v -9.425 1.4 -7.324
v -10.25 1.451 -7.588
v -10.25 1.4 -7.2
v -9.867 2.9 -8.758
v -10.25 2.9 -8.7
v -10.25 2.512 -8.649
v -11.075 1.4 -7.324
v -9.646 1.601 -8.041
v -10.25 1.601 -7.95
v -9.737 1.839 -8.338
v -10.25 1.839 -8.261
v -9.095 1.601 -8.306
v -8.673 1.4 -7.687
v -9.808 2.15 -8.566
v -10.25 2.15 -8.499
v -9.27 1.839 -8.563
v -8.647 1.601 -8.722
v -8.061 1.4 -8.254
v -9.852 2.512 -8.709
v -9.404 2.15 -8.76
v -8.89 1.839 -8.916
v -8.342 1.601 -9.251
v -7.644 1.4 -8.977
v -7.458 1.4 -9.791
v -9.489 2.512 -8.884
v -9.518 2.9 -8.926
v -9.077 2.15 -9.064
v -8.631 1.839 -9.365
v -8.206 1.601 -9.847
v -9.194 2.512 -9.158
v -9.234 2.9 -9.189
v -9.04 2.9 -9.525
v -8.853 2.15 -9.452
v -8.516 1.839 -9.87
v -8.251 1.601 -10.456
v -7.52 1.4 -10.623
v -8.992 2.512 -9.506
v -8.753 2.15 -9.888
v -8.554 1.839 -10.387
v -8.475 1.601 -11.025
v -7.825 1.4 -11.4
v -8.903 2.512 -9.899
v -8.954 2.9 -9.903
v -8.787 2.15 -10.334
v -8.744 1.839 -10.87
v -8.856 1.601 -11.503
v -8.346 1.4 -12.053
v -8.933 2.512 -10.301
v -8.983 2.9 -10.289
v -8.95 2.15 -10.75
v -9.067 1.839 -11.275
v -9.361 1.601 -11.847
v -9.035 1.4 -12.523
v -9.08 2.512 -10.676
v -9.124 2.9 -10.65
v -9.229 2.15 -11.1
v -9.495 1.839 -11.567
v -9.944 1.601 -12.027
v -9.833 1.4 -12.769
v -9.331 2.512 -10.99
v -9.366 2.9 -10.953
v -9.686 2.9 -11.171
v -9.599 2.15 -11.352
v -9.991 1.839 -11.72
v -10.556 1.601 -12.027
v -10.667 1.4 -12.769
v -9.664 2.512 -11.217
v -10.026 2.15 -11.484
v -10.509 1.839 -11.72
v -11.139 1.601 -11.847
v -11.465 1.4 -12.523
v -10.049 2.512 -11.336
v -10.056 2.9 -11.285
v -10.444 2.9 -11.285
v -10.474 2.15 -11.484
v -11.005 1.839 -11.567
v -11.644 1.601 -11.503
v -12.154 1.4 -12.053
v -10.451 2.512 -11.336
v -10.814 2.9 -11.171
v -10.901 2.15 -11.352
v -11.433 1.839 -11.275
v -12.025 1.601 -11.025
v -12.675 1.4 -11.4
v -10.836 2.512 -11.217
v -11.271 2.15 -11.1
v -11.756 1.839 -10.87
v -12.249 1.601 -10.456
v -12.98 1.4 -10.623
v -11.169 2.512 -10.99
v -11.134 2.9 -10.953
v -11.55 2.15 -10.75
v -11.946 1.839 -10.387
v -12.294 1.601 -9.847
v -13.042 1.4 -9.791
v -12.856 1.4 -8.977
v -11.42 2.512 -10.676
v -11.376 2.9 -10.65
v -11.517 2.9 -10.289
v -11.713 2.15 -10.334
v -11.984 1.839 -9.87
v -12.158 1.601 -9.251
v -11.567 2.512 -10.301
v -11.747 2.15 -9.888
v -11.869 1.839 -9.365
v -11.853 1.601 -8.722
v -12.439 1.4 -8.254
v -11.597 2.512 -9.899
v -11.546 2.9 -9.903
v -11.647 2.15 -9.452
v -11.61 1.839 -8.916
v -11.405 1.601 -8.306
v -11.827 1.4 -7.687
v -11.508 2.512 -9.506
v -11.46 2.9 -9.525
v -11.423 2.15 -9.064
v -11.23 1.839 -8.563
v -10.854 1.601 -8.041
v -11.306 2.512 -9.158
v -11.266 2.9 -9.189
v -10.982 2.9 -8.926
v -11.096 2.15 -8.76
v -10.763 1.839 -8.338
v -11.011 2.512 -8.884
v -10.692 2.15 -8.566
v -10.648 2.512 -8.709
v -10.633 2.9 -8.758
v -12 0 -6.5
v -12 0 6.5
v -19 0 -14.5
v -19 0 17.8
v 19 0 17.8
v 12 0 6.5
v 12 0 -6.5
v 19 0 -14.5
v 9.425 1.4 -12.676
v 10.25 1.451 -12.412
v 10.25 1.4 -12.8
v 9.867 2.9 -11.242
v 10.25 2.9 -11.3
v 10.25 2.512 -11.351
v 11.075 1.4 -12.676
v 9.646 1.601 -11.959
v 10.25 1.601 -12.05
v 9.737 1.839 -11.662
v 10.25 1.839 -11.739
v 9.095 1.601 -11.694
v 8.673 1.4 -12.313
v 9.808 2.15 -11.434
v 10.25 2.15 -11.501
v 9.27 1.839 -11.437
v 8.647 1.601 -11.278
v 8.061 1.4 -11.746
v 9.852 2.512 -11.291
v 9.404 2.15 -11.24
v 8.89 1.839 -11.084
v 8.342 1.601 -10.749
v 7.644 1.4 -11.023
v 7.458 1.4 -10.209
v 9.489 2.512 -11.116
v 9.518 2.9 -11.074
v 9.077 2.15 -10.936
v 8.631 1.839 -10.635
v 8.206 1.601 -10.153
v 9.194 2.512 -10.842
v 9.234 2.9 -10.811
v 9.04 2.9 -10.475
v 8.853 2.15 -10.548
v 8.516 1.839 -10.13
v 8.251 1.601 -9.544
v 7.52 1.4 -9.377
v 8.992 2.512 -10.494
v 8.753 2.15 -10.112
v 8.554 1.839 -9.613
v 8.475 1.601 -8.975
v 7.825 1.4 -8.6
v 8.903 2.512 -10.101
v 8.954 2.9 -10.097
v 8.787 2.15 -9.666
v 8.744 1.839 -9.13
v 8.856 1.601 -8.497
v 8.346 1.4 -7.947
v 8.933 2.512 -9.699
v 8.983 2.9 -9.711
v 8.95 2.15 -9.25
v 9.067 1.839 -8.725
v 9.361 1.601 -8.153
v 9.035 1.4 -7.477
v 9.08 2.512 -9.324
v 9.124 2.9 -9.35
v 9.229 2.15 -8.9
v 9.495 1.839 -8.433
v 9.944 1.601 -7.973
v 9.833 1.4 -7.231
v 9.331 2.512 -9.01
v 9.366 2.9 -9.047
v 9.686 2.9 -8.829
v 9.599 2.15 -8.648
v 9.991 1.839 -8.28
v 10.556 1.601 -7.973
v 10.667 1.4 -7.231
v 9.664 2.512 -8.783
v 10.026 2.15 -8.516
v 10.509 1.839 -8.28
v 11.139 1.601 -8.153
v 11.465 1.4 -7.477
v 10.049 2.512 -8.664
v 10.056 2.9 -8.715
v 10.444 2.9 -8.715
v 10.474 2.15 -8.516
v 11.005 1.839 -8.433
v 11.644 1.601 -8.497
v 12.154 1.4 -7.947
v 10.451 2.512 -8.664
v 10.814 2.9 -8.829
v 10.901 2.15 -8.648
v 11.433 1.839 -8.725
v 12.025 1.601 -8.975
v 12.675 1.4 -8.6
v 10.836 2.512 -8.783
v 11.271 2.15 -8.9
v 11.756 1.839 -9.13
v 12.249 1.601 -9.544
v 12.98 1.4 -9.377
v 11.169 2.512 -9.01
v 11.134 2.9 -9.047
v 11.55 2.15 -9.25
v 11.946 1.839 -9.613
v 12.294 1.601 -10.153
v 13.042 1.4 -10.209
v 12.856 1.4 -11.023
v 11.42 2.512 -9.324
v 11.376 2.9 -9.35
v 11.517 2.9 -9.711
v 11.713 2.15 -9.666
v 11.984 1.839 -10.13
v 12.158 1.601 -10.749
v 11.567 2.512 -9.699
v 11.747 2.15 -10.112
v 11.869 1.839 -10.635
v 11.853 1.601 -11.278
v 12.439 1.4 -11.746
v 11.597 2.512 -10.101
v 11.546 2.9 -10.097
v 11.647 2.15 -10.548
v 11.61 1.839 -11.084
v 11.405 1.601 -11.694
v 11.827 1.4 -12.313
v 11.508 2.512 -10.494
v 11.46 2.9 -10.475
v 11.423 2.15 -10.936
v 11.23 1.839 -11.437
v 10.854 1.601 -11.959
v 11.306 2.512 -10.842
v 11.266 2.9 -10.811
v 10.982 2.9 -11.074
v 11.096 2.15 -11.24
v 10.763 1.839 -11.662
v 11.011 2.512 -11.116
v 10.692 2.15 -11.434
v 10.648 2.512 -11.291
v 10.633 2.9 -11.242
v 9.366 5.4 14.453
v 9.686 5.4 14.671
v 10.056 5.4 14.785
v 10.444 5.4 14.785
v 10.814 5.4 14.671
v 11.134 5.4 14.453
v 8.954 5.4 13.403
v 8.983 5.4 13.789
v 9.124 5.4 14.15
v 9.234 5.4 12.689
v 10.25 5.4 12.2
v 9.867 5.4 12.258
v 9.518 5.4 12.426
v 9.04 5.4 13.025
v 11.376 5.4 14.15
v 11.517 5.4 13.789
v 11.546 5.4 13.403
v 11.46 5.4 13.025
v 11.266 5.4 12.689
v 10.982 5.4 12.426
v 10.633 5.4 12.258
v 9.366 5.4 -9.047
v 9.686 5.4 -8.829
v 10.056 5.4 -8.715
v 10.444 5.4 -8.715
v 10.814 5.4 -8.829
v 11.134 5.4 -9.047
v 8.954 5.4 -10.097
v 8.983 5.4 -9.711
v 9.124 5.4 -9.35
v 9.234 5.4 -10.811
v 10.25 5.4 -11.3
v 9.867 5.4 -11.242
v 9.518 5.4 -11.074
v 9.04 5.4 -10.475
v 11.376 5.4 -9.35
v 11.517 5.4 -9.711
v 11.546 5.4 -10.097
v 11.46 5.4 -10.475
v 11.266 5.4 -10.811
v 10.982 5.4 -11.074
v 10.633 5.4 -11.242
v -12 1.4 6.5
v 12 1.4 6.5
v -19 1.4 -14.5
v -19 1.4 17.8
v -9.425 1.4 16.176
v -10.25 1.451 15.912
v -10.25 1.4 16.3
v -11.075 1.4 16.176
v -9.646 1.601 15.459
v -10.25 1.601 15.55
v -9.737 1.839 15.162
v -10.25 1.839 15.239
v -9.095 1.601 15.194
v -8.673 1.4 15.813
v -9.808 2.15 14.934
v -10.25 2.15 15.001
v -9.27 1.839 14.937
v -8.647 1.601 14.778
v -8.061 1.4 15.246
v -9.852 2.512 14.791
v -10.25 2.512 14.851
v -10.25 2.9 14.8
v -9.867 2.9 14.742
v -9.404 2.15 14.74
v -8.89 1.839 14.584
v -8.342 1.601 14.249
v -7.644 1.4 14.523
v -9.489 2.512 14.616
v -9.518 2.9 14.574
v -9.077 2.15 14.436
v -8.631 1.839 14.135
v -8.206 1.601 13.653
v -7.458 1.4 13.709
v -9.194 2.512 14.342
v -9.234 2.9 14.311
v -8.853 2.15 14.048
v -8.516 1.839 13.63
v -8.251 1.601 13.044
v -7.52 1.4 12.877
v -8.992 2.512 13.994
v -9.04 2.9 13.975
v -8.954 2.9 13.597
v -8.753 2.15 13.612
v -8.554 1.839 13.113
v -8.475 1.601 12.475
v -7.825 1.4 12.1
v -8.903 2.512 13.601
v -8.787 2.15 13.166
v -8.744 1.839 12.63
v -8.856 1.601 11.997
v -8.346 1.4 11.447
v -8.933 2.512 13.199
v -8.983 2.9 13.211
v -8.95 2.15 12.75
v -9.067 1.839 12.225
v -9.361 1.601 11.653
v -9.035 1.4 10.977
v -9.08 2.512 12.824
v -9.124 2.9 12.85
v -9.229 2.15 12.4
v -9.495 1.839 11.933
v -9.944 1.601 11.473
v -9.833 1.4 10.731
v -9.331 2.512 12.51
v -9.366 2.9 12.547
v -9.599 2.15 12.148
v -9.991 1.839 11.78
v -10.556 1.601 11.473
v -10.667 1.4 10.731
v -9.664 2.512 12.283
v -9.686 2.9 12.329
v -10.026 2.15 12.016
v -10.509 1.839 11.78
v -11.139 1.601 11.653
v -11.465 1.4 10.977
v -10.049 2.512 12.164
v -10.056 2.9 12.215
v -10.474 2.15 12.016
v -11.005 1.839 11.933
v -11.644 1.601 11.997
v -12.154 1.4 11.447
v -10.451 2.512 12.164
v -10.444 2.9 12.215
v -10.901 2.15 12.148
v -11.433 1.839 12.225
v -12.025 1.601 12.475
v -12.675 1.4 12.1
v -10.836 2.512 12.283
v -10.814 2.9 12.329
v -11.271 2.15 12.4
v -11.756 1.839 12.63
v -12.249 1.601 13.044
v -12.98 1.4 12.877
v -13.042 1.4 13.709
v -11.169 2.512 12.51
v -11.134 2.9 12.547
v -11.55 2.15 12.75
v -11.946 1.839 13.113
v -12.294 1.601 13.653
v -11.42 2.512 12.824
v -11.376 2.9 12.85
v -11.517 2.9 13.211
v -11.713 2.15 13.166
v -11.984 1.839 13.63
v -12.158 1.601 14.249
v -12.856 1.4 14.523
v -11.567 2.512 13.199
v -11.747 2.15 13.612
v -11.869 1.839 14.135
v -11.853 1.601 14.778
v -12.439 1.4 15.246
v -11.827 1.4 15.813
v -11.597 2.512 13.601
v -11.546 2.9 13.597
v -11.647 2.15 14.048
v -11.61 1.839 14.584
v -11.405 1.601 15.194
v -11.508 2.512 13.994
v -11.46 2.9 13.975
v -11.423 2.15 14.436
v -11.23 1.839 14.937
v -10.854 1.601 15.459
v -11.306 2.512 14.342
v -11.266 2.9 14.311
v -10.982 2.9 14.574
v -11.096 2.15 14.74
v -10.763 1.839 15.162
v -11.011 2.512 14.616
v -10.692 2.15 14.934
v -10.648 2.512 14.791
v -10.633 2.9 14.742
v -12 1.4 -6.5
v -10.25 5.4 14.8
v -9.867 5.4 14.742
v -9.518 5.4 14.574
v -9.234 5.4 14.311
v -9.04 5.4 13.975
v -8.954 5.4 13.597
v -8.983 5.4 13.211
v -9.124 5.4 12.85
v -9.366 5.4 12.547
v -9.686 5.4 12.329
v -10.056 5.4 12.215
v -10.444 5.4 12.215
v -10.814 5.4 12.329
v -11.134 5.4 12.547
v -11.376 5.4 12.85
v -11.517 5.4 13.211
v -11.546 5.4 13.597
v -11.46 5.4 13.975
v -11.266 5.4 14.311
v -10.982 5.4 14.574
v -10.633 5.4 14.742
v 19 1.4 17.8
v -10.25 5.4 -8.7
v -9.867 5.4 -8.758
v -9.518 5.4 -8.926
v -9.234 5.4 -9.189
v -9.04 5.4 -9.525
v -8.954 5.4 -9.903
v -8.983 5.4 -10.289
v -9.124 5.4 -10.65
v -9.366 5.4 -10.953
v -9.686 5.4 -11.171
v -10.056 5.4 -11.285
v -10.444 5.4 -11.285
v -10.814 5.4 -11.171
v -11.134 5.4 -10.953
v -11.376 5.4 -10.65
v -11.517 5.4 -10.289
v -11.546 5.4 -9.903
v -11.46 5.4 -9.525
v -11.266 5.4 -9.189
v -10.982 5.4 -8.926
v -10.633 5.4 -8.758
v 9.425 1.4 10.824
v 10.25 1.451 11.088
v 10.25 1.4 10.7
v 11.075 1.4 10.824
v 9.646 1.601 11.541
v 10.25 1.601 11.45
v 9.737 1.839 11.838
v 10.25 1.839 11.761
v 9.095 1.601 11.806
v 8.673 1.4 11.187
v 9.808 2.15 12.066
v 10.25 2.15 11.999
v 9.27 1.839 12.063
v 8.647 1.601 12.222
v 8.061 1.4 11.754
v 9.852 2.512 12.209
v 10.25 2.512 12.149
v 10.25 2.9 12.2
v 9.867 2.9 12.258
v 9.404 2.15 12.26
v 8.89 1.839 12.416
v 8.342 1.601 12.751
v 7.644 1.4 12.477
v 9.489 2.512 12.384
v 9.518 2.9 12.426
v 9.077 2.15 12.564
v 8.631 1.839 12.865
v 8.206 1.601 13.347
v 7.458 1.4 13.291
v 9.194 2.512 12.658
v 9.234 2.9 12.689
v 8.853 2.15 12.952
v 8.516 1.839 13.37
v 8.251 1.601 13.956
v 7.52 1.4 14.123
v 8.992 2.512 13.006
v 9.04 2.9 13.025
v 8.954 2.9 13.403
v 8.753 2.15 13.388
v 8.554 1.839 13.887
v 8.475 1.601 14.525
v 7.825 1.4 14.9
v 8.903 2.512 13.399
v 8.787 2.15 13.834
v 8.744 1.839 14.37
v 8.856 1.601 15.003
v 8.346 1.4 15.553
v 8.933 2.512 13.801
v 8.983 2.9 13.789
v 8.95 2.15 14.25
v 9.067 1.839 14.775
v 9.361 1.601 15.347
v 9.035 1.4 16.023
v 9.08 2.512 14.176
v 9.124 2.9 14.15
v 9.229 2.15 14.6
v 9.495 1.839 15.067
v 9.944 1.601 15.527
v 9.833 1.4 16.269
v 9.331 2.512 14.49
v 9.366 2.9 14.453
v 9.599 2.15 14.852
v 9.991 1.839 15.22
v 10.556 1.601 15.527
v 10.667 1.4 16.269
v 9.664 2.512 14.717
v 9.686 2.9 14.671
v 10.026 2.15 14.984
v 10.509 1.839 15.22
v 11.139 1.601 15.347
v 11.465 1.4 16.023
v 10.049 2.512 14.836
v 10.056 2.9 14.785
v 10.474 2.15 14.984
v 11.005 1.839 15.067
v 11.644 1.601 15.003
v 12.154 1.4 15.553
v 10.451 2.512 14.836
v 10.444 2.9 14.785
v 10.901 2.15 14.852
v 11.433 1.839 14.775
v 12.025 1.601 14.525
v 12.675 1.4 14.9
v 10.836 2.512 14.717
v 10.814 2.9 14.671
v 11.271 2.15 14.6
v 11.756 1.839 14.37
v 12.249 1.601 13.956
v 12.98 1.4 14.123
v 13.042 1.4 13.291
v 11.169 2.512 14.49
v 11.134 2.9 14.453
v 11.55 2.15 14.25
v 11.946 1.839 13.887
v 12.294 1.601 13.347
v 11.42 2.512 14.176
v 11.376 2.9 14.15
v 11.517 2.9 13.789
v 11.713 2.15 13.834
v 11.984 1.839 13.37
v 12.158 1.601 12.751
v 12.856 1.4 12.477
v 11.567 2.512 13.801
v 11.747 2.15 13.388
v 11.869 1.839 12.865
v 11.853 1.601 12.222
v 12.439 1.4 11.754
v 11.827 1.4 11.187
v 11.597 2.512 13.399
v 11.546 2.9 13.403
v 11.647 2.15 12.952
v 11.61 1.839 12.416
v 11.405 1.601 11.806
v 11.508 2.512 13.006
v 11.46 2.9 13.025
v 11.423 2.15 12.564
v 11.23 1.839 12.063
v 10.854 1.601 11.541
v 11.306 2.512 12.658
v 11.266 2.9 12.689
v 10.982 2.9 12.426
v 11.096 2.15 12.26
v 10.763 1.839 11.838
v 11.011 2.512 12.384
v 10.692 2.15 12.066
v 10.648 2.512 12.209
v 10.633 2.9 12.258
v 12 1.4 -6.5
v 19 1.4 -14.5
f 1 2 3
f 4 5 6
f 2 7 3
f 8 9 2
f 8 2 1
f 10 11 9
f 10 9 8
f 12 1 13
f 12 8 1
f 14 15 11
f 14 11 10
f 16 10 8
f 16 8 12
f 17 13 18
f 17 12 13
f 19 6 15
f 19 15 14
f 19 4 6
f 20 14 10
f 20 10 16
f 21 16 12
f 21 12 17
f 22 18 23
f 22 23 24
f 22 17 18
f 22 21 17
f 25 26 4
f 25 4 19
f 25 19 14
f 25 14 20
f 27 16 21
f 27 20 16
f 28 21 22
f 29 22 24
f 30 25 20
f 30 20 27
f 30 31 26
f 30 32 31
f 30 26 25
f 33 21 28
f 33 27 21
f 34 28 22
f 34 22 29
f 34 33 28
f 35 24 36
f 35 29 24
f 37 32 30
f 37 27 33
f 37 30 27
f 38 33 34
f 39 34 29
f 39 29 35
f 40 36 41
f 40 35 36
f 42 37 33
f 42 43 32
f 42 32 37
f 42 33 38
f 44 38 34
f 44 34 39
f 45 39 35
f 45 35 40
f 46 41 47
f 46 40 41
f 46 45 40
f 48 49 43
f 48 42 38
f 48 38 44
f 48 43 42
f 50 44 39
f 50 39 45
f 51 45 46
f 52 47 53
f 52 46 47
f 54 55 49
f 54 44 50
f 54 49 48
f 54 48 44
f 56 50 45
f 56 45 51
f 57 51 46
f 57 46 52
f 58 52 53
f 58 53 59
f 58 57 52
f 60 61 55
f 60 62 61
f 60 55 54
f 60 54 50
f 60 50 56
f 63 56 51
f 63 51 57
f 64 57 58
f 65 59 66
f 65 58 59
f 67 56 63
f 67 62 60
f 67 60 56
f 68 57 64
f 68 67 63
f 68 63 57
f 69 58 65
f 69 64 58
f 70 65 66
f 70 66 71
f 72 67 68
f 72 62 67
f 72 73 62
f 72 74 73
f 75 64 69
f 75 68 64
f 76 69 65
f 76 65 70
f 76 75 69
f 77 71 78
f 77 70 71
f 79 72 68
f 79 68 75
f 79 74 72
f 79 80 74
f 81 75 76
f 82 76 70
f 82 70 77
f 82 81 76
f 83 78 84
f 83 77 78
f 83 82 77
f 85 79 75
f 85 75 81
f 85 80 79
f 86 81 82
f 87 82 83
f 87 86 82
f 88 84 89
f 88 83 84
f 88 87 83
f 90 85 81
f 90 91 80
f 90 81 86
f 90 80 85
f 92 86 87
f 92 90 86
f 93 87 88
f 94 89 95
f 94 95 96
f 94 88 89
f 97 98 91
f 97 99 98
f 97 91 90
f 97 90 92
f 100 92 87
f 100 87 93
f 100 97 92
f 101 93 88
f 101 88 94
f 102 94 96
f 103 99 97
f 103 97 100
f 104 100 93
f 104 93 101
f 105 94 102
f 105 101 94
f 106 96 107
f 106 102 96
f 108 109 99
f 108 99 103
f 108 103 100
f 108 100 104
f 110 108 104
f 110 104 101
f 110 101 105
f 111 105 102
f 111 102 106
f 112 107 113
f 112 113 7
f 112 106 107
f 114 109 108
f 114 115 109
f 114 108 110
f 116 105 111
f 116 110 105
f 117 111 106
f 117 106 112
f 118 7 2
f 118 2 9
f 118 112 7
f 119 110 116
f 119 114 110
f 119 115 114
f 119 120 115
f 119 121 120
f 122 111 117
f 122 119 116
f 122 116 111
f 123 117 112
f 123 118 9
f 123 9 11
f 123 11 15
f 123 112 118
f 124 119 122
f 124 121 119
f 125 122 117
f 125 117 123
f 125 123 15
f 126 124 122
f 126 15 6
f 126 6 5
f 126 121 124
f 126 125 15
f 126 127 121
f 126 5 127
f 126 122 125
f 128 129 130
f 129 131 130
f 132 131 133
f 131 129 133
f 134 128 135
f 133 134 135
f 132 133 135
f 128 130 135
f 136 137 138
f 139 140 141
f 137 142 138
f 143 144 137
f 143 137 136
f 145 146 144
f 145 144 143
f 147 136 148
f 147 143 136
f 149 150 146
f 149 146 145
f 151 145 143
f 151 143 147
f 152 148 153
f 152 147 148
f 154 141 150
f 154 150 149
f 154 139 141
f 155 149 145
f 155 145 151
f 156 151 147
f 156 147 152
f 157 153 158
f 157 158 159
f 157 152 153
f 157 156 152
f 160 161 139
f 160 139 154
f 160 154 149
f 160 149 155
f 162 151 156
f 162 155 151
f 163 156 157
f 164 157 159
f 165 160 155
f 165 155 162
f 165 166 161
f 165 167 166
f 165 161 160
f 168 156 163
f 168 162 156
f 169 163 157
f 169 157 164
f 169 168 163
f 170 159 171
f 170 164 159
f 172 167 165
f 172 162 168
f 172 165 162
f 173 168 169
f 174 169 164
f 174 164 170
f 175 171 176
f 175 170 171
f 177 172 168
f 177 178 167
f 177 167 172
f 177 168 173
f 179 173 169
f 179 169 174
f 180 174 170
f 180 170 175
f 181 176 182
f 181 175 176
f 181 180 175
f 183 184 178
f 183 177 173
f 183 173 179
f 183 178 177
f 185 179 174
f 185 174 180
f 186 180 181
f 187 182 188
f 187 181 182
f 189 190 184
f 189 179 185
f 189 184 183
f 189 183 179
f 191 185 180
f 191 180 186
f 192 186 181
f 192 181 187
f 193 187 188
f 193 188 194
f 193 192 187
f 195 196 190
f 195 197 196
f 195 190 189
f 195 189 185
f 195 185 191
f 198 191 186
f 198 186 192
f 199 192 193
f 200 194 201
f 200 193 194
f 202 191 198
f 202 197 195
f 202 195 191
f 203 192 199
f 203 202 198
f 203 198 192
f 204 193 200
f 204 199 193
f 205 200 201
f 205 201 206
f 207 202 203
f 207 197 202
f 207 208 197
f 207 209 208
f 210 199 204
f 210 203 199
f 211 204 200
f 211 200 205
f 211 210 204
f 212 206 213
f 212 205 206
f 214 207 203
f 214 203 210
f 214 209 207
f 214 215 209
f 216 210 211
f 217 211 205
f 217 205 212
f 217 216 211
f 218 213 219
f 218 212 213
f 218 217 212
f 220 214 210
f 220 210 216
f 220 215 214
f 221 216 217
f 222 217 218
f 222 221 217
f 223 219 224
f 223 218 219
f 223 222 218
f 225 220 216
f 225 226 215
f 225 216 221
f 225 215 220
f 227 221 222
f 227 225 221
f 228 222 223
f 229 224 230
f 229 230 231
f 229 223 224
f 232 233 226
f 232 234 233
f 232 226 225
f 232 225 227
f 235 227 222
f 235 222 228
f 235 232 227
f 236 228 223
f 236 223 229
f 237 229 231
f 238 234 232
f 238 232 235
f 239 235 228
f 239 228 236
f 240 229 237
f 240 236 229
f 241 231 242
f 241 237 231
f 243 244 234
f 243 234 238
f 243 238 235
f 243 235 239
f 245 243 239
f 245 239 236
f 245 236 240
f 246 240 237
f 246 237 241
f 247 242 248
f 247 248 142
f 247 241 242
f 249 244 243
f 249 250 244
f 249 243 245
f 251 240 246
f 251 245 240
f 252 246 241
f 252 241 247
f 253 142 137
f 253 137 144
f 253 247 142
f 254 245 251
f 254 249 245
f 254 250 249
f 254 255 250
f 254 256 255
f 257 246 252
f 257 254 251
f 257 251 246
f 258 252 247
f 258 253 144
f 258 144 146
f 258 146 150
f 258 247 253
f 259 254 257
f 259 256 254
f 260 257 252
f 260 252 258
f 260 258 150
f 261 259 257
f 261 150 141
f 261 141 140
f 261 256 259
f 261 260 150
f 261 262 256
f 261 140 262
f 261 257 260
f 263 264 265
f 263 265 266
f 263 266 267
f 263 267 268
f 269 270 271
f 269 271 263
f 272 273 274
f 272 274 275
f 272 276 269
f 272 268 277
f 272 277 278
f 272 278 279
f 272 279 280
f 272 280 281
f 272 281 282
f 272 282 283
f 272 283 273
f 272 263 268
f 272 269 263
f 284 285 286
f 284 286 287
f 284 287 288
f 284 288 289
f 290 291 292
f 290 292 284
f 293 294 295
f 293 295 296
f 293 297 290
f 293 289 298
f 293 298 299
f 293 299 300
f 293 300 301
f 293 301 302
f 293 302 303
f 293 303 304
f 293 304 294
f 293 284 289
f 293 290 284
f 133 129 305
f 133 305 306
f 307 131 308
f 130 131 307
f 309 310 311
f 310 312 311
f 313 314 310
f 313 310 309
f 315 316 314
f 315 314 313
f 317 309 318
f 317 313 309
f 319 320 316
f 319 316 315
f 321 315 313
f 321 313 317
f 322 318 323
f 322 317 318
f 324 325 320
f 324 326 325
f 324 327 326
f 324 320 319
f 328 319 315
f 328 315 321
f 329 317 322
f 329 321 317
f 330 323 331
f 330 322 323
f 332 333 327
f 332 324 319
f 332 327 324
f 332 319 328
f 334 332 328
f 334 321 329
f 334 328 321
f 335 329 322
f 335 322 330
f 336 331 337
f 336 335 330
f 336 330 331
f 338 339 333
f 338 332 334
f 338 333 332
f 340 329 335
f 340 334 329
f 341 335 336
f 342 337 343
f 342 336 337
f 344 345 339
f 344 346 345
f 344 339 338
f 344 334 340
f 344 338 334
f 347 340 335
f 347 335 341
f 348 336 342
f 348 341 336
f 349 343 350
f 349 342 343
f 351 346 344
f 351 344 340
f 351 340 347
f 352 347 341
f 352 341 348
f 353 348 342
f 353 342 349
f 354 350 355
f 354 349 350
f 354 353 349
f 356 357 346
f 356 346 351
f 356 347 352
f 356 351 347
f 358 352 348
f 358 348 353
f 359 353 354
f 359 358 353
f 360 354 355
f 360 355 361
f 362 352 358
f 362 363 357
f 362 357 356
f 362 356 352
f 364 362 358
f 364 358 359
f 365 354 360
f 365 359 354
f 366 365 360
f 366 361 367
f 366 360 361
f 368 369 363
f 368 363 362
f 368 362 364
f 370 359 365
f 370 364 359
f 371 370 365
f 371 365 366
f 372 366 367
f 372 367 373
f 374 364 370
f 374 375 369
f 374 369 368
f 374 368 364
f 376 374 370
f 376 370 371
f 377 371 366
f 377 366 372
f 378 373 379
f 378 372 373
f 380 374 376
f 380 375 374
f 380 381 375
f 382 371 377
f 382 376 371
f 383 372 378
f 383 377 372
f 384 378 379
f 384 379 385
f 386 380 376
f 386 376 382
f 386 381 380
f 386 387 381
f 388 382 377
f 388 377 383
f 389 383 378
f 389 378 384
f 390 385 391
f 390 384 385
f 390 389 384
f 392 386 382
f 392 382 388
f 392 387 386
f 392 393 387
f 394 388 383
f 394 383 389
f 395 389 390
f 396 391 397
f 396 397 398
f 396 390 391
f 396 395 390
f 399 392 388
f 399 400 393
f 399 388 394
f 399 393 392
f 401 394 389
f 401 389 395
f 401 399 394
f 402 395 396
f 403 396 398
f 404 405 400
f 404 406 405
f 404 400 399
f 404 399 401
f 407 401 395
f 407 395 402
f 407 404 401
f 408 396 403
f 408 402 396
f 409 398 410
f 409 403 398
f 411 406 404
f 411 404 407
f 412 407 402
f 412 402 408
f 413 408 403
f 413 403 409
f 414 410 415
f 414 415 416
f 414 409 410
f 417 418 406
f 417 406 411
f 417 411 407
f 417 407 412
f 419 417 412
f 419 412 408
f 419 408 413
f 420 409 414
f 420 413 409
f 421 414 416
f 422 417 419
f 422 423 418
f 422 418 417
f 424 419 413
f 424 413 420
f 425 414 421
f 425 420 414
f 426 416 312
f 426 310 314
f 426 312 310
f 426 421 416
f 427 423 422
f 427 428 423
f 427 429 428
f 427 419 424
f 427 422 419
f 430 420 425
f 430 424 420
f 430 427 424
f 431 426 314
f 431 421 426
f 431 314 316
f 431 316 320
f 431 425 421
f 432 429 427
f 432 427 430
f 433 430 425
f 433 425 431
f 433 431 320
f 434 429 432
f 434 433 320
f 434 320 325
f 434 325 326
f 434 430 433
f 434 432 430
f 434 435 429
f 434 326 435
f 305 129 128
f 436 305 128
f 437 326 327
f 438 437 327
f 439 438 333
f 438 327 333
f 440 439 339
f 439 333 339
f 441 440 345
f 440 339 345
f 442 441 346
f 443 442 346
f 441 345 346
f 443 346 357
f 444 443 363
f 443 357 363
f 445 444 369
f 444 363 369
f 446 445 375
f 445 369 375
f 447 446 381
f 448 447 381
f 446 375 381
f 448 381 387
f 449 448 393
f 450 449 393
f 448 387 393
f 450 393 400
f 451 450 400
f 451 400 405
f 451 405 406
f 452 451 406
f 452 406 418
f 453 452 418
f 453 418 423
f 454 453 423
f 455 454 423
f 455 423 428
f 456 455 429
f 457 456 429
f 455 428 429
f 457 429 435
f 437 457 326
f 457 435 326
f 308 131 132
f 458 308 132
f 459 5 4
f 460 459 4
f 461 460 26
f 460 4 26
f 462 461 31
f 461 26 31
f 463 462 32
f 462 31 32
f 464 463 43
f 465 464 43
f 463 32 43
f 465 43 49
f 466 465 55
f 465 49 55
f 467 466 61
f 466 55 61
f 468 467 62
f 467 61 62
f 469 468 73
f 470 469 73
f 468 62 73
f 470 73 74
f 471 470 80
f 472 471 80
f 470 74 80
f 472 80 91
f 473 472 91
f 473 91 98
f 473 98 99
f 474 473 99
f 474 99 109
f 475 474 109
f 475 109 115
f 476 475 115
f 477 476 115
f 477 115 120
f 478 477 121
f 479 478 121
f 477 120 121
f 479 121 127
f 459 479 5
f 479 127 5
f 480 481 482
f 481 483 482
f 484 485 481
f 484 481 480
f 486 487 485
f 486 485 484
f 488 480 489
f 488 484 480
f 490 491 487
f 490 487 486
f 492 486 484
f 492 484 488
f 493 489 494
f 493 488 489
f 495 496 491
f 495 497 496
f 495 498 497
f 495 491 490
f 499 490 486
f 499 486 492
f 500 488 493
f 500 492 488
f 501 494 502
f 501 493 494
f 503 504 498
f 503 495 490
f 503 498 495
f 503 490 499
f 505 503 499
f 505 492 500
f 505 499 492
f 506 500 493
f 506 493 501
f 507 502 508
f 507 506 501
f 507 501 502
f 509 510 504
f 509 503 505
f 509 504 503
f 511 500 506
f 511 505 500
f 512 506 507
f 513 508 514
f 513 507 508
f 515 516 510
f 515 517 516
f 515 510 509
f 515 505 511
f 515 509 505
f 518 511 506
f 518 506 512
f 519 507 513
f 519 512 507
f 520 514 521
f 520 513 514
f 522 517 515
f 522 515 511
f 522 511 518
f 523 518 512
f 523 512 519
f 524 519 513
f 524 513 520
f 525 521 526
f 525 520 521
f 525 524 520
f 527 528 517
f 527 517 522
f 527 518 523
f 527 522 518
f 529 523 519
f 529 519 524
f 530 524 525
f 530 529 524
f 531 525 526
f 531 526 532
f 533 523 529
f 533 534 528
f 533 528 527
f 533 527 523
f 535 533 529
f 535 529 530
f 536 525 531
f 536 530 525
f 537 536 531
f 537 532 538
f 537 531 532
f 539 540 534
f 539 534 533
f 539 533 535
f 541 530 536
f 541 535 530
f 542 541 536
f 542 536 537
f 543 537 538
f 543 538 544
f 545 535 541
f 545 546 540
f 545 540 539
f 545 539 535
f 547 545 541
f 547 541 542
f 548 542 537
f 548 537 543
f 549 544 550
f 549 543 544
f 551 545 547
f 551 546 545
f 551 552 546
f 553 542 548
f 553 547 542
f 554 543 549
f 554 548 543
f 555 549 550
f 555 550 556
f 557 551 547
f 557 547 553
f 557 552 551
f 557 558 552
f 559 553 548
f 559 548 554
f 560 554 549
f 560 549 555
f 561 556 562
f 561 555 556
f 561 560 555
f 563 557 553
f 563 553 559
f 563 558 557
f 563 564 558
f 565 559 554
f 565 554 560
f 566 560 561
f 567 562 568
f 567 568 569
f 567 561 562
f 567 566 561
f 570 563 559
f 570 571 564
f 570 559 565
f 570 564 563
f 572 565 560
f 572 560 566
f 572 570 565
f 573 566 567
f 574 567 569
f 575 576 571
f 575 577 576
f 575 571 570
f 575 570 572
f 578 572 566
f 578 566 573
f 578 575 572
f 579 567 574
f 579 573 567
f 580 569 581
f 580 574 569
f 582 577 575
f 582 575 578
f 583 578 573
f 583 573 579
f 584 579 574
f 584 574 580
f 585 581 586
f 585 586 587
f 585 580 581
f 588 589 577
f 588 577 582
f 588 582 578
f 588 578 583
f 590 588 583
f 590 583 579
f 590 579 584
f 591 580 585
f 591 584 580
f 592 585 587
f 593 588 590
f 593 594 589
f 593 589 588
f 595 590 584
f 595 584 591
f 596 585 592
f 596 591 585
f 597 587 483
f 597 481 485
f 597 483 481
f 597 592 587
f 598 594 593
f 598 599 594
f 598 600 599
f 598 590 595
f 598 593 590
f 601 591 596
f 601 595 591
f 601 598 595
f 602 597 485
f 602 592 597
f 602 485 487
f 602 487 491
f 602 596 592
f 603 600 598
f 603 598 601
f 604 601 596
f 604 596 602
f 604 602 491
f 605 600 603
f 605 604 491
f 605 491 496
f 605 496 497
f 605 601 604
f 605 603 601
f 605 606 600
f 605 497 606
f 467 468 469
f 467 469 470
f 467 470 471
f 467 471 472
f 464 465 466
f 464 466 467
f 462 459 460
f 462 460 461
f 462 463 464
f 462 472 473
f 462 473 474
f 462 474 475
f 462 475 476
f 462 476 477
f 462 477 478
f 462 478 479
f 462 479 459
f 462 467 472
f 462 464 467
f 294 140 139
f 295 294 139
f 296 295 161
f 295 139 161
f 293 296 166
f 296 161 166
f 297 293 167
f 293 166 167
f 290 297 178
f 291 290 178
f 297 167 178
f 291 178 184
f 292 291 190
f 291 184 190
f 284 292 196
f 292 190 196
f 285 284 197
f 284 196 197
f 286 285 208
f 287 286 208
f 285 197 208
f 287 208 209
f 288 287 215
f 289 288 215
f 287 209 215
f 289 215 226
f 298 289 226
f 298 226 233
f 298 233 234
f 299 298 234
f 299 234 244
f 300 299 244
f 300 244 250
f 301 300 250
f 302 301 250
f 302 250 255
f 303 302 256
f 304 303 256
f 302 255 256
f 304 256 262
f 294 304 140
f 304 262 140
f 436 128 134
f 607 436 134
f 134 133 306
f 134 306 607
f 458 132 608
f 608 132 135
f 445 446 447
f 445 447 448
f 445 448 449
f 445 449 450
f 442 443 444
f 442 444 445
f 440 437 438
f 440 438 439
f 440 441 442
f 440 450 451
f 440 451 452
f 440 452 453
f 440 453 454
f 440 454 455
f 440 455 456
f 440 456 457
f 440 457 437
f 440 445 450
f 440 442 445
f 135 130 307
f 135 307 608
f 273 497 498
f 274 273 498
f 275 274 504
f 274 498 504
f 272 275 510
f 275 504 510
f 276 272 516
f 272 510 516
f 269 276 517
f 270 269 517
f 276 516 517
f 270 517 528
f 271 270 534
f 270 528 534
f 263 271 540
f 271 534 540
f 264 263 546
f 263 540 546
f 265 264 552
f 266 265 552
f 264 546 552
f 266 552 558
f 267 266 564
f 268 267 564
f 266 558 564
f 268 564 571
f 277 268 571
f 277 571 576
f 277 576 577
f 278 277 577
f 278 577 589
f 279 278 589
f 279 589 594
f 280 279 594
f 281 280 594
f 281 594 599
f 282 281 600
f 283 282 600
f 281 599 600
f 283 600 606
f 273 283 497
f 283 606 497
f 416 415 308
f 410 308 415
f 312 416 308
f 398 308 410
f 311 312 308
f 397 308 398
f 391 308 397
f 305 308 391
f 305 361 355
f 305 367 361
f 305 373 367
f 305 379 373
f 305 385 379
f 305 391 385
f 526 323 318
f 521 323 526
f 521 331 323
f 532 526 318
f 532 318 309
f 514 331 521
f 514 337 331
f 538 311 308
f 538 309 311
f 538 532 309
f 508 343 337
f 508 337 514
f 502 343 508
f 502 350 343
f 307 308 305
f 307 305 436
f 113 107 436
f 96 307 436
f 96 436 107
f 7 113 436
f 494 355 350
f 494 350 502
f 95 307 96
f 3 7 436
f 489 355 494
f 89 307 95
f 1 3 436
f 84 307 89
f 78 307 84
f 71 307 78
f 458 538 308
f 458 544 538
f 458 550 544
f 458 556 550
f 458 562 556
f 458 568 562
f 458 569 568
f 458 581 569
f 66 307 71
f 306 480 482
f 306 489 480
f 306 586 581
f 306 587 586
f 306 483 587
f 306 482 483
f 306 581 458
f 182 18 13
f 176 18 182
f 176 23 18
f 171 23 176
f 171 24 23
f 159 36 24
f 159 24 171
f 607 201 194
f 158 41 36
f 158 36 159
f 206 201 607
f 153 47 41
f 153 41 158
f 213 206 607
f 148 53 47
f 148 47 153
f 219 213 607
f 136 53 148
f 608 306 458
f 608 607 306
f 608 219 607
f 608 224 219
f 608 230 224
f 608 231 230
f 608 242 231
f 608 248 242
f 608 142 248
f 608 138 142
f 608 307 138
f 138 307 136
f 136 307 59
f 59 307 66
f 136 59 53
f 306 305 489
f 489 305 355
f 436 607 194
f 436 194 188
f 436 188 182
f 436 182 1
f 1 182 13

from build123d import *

# Parameters (mm, degrees)
SKETCH1_W           = 38
SKETCH1_H           = 32.3
SKETCH1_W_2         = 24
SKETCH1_H_2         = 13
BOSS_EXTRUDE1_DEPTH = 1.4
SKETCH2_R           = 1.3
BOSS_EXTRUDE2_DEPTH = 4
FILLET1_R           = 1.5


with BuildPart() as part:
    # Sketch1 → Boss-Extrude1 (new body)
    with BuildSketch(Plane(origin=(0, 0, 0), x_dir=(1, 0, 0), z_dir=(0, 1, 0))):
        with Locations((0, -1.65)):
            Rectangle(SKETCH1_W, SKETCH1_H)
        Rectangle(SKETCH1_W_2, SKETCH1_H_2, mode=Mode.SUBTRACT)
    extrude(amount=BOSS_EXTRUDE1_DEPTH)

    # Sketch2 → Boss-Extrude2 (add)
    with BuildSketch(Plane(origin=(0, 1.4, 0), x_dir=(1, 0, 0), z_dir=(0, 1, 0))):
        with Locations(Location((-10.25, 10, 0), (0, 0, 270))):
            Circle(SKETCH2_R)
        with Locations(Location((-10.25, -13.5, 0), (0, 0, 270))):
            Circle(SKETCH2_R)
        with Locations(Location((10.25, -13.5, 0), (0, 0, 90))):
            Circle(SKETCH2_R)
        with Locations(Location((10.25, 10, 0), (0, 0, 90))):
            Circle(SKETCH2_R)
    extrude(amount=BOSS_EXTRUDE2_DEPTH)

    # Fillet1
    fillet1_edges = [part.edges().sort_by_distance(p)[0] for p in [
        (-10.25, 1.4, -11.3),
        (-10.25, 1.4, 12.2),
        (10.25, 1.4, 14.8),
        (10.25, 1.4, -8.7),
    ]]
    fillet(fillet1_edges, radius=FILLET1_R)


solid = part.part
